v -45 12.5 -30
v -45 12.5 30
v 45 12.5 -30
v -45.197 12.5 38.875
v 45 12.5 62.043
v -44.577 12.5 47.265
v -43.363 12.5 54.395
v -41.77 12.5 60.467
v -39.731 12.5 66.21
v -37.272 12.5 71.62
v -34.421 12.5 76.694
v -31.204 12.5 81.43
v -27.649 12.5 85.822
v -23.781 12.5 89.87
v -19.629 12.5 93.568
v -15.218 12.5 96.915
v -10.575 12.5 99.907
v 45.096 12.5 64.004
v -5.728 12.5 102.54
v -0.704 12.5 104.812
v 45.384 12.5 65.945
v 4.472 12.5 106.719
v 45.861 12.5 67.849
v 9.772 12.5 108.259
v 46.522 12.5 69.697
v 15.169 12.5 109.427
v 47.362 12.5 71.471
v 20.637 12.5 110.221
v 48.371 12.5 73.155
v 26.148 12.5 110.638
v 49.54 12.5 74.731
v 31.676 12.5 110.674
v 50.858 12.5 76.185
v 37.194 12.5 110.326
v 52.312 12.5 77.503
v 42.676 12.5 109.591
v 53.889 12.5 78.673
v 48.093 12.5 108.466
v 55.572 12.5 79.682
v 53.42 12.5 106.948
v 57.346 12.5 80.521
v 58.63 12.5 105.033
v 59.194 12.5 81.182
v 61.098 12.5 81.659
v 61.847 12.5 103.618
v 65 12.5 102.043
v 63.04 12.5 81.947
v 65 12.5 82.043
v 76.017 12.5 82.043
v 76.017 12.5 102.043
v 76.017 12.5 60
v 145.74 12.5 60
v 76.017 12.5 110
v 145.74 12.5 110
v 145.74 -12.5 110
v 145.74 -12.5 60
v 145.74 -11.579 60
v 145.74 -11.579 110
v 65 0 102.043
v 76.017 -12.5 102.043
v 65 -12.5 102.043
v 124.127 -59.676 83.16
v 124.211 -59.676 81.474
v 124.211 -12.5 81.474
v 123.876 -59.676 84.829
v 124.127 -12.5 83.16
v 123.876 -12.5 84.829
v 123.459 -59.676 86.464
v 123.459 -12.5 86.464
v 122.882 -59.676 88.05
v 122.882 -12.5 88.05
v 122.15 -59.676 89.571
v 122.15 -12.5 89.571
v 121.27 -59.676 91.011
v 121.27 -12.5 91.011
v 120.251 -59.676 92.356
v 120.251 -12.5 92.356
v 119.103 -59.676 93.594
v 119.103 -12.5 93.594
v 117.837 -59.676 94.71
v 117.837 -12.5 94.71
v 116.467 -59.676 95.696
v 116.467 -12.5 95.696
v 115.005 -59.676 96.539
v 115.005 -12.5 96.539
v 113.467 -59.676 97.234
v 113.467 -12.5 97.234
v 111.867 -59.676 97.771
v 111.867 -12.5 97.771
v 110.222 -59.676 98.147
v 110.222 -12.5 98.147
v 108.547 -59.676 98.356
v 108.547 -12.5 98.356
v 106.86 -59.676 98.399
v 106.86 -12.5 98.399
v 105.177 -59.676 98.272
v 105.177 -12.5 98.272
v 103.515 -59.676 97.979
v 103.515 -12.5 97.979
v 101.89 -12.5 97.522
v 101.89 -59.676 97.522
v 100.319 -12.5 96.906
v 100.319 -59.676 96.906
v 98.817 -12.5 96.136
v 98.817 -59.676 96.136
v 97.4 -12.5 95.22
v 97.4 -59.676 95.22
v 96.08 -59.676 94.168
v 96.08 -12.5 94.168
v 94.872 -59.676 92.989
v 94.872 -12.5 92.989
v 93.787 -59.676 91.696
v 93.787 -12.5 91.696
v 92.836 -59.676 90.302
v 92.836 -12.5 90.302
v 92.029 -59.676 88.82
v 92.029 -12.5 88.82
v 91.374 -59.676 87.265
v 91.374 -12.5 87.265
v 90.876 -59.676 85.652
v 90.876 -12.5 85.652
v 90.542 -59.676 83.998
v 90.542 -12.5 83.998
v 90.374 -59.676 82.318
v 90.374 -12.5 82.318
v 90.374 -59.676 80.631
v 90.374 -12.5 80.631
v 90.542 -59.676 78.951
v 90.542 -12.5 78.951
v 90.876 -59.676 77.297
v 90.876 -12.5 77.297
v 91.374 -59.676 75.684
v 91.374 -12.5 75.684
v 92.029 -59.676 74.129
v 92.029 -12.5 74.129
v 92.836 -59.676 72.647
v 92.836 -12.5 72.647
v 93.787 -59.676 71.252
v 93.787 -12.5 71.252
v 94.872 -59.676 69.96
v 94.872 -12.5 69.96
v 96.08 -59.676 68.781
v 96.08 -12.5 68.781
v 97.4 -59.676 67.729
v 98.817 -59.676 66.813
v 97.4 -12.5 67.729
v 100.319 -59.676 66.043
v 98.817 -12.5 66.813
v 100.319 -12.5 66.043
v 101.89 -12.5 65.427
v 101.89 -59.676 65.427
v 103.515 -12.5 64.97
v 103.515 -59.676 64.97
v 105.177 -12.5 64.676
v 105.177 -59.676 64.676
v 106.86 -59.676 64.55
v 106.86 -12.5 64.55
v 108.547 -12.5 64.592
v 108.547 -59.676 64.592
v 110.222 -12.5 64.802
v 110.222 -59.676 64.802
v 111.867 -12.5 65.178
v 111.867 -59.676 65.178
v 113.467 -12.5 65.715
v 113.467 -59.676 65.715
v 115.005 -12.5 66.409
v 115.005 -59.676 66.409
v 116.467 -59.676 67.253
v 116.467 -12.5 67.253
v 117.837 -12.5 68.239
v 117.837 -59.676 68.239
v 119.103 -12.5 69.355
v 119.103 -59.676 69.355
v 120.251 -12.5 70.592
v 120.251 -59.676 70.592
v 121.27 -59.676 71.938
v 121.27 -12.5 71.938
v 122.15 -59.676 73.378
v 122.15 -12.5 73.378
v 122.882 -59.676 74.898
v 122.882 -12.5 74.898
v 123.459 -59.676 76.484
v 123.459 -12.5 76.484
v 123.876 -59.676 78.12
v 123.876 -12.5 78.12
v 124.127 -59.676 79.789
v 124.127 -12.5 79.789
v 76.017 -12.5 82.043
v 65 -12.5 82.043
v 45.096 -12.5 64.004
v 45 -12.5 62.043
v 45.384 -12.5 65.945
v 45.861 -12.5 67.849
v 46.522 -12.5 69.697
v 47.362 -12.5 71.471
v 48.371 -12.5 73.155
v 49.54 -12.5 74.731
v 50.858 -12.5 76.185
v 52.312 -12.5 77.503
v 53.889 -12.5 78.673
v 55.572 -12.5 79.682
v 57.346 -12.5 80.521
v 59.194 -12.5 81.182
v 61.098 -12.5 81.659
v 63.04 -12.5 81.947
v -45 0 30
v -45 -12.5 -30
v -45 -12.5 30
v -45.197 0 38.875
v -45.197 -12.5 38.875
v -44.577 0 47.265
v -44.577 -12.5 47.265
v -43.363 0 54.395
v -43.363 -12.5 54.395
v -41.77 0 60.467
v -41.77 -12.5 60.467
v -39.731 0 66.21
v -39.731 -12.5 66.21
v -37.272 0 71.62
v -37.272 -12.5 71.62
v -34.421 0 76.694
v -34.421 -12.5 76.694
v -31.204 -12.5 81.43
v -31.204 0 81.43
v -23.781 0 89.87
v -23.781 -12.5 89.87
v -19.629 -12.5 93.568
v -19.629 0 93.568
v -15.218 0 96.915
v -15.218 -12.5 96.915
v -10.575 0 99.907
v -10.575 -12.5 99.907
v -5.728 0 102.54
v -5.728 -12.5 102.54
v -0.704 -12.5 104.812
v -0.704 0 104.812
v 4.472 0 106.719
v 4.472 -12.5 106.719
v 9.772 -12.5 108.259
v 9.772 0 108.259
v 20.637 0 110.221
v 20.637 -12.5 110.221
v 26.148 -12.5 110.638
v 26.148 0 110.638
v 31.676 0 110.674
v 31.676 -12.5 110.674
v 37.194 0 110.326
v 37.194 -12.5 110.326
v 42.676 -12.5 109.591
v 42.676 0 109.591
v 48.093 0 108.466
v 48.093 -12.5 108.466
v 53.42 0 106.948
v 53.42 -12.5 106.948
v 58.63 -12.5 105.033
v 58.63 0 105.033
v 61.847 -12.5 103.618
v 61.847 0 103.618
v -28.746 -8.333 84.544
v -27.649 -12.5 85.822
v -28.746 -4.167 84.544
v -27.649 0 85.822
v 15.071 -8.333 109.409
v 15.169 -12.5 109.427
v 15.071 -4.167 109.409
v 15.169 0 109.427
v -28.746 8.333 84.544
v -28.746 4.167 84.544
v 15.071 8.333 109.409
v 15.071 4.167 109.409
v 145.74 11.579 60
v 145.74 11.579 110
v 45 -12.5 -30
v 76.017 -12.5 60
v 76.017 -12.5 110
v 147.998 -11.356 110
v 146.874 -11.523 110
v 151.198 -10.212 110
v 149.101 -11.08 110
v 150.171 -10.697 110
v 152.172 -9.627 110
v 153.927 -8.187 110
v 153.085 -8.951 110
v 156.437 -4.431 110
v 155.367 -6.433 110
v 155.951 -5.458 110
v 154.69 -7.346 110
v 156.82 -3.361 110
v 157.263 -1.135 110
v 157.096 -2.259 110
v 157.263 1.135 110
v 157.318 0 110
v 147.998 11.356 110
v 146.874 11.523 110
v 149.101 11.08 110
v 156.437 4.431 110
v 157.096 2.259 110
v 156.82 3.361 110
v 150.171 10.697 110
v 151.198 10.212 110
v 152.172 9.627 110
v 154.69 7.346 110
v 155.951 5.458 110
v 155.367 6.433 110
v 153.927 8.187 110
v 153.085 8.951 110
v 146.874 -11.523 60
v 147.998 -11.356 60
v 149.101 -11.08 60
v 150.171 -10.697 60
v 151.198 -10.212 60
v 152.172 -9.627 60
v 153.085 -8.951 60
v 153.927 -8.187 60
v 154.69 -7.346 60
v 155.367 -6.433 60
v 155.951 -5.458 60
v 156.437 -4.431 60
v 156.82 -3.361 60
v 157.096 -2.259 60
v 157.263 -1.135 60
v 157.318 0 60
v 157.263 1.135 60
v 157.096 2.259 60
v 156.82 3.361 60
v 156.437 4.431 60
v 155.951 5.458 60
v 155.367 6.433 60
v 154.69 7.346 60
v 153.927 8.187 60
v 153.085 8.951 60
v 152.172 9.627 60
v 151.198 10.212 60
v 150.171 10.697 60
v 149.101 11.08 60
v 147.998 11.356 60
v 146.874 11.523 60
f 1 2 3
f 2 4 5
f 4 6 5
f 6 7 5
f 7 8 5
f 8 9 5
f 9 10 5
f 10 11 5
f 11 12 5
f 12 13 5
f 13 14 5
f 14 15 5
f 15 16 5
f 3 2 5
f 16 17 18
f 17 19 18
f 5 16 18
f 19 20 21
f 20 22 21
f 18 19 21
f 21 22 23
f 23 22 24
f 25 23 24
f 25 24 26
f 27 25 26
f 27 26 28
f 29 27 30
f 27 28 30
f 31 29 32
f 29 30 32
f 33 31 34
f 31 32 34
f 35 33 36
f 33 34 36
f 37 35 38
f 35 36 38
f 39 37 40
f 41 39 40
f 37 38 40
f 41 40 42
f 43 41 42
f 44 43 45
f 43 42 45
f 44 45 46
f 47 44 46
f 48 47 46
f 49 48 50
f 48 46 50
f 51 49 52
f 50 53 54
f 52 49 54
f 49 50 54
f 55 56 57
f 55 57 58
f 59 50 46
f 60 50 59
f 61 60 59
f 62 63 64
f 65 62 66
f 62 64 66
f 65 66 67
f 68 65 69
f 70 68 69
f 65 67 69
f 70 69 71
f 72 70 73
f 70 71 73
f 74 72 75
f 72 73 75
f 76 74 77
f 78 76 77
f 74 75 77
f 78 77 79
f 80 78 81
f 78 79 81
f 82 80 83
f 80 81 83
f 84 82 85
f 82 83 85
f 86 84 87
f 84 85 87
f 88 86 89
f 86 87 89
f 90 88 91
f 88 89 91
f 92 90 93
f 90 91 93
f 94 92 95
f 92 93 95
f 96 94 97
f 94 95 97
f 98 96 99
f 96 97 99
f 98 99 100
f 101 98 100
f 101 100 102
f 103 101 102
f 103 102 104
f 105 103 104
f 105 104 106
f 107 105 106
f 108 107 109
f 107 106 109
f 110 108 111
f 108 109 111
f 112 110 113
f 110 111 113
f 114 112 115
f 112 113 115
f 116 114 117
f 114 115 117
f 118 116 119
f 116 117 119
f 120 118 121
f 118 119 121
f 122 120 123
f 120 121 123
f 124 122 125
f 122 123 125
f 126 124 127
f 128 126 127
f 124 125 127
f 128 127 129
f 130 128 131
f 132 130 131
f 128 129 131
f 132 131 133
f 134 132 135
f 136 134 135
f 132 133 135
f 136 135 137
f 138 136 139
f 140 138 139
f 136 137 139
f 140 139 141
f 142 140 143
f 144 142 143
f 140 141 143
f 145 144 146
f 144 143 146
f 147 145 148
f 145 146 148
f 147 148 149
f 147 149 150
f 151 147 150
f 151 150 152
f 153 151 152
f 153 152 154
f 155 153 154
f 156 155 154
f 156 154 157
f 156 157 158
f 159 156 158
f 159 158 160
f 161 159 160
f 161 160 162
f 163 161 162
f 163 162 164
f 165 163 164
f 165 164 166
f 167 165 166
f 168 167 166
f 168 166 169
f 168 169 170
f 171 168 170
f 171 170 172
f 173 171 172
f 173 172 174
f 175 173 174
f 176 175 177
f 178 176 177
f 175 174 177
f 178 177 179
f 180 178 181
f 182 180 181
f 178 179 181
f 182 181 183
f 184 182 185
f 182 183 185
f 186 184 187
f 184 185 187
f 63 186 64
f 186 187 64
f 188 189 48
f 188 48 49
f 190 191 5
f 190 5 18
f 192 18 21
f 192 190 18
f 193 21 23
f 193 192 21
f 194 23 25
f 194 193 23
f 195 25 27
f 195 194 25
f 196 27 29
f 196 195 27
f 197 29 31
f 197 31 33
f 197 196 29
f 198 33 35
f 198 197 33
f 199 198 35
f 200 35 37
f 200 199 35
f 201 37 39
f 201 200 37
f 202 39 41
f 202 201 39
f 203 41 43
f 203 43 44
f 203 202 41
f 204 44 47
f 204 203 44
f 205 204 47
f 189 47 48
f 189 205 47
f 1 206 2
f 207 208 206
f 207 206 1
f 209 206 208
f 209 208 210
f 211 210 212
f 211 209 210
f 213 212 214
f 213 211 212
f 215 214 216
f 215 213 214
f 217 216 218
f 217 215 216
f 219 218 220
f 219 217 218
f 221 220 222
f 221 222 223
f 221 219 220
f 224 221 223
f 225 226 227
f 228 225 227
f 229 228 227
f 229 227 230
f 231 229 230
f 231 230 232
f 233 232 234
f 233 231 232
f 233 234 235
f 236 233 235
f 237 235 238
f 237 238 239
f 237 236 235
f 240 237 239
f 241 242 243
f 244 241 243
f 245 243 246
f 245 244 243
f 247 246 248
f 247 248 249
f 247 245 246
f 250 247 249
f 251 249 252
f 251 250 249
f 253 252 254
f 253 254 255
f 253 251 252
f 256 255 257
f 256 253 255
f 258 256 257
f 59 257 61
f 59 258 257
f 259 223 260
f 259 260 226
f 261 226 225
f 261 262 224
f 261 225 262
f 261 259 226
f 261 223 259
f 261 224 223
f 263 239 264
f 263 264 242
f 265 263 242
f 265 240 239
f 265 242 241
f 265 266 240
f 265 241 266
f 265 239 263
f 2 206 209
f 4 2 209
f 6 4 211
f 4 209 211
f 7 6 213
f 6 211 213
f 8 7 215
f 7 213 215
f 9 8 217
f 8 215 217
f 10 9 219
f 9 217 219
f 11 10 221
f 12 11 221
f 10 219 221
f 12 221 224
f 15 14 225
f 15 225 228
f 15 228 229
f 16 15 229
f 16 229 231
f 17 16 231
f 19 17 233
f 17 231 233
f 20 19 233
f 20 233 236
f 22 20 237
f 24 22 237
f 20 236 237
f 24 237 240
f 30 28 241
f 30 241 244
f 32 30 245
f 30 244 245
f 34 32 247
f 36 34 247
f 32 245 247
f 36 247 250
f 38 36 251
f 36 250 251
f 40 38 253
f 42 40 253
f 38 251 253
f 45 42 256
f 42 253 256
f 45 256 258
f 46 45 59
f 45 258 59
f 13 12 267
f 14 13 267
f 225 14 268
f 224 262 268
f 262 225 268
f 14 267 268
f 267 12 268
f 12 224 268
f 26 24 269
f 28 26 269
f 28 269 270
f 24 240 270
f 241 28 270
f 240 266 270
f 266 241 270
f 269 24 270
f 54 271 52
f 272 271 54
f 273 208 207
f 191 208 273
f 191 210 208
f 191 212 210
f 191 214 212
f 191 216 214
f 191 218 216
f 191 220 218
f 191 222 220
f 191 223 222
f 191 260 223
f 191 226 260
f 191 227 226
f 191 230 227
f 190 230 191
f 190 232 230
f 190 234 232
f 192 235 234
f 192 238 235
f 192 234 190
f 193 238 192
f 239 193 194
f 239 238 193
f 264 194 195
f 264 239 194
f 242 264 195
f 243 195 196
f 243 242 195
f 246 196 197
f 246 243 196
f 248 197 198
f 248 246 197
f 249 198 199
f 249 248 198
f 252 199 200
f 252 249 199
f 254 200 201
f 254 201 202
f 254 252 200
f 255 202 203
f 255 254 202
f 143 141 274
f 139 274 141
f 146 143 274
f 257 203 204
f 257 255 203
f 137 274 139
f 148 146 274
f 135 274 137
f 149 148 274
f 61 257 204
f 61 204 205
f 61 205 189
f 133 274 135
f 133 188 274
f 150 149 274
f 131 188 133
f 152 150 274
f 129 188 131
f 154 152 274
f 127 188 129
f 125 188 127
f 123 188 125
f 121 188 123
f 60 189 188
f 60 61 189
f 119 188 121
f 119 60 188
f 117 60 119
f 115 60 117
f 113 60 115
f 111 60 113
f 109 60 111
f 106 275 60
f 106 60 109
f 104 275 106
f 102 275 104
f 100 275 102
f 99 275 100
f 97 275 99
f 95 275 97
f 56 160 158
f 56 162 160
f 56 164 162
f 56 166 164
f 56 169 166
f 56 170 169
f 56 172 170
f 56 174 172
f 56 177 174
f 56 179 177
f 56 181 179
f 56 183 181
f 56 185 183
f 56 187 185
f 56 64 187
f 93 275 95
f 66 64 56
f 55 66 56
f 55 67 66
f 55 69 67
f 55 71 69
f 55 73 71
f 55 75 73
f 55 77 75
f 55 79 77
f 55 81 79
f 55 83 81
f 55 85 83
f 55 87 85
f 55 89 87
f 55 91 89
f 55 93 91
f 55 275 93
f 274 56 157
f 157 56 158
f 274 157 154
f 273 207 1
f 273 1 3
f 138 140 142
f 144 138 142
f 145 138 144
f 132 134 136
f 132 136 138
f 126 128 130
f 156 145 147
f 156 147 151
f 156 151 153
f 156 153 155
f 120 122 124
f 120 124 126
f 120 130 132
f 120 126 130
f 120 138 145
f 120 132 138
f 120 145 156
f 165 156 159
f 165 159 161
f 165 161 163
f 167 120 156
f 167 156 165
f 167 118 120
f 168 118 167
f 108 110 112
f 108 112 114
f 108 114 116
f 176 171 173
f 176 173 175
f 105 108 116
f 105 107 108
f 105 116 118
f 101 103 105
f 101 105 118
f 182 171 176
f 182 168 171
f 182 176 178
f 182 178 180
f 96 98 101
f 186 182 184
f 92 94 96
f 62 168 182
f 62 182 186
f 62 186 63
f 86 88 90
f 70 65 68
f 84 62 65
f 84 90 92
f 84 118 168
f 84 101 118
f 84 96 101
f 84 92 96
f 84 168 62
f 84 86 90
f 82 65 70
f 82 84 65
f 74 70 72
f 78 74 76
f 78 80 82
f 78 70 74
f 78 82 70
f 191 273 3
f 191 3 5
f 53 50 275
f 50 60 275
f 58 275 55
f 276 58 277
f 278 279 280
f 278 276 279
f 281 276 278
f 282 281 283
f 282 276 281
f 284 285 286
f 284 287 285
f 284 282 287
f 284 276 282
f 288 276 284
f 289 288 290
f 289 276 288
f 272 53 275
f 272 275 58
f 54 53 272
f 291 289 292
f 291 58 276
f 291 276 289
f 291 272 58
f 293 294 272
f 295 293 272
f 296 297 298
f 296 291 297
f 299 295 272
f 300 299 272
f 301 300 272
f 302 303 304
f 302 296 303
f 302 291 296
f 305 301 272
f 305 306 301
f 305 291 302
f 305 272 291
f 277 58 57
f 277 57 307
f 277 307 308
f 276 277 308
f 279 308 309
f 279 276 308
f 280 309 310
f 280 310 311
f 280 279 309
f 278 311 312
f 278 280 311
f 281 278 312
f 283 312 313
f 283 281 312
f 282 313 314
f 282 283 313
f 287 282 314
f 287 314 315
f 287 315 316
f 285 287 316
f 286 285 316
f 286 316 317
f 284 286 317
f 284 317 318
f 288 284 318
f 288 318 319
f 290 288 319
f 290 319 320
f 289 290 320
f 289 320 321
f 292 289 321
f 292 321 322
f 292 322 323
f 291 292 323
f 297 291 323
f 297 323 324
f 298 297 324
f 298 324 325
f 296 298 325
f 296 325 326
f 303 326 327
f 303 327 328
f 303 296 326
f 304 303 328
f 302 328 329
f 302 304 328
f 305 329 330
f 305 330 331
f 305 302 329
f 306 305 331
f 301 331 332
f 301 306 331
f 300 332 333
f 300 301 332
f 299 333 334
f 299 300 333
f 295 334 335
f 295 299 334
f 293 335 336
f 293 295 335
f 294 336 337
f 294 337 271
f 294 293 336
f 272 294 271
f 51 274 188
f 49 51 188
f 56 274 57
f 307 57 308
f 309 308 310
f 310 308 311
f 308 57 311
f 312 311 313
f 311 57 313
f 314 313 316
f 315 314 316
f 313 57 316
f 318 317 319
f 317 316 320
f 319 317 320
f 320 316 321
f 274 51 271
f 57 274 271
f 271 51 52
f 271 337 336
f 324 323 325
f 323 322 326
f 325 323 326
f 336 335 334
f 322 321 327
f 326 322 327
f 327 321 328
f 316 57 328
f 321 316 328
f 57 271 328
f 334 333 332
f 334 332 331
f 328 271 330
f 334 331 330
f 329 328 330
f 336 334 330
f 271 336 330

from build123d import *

# Parameters (mm, degrees)
F0_W     = 42.7631036925
F0_H     = 22.0432821037
F0_H_2   = 7.9567178963
F0_H_3   = 20
F1_DEPTH = 12.5
F2_R     = 11.5788396241
F3_DEPTH = 50
F4_R     = 16.9293792231
F5_DEPTH = 47.1764579415


with BuildPart() as f1:
    # F0 (on Front) → F1 (new body, symmetric)
    with BuildSketch(Plane.XZ):
        Polygon((25, 30), (-45, 30), (-45, -30), (45, -30), (45, 30), align=None)
        with BuildLine():
            add(Edge.make_bspline(
                [(-45, 30), (-49.6783256531, 98.533667624), (19.1648956388, 126.3746768236), (65, 102.0432821037)],
                knots=[0, 0, 0, 0, 131.4923362644, 131.4923362644, 131.4923362644, 131.4923362644], degree=3))
            Line((-45, 30), (25, 30))
            Line((25, 30), (25, 62.0432821037))
            ThreePointArc((25, 62.0432821037), (36.7157287525, 90.3275533511), (65, 102.0432821037))
        make_face()
        with Locations((97.3985187706, 71.0216410518)):
            Rectangle(F0_W, F0_H)
        with Locations((97.3985187706, 106.0216410518)):
            Rectangle(F0_W, F0_H_2)
        with BuildLine():
            Line((25, 62.0432821037), (25, 30))
            Line((25, 30), (45, 30))
            Line((45, 30), (45, 62.0432821037))
            ThreePointArc((45, 62.0432821037), (50.8578643763, 76.1854177274), (65, 82.0432821037))
            Line((65, 82.0432821037), (76.0169669243, 82.0432821037))
            Line((76.0169669243, 82.0432821037), (76.0169669243, 102.0432821037))
            Line((76.0169669243, 102.0432821037), (65, 102.0432821037))
            ThreePointArc((65, 102.0432821037), (36.7157287525, 90.3275533511), (25, 62.0432821037))
        make_face()
        Polygon((118.7800706168, 110), (118.7800706168, 102.0432821037), (118.7800706168, 82.0432821037), (118.7800706168, 60), (145.7395272495, 60), (145.7395272495, 110), align=None)
        with Locations((97.3985187706, 92.0432821037)):
            Rectangle(F0_W, F0_H_3)
    extrude(amount=F1_DEPTH, both=True)

    # F2 (on face) → F3 (join)
    with BuildSketch(Plane.XY.offset(110)):
        with Locations((145.7395272495, 0)):
            Circle(F2_R)
    extrude(amount=-F3_DEPTH)

    # F4 (on face) → F5 (join)
    with BuildSketch(Plane.XZ.offset(12.5)):
        with Locations((107.2820425034, 81.4744457603)):
            Circle(F4_R)
    extrude(amount=F5_DEPTH)


solid = f1.part
